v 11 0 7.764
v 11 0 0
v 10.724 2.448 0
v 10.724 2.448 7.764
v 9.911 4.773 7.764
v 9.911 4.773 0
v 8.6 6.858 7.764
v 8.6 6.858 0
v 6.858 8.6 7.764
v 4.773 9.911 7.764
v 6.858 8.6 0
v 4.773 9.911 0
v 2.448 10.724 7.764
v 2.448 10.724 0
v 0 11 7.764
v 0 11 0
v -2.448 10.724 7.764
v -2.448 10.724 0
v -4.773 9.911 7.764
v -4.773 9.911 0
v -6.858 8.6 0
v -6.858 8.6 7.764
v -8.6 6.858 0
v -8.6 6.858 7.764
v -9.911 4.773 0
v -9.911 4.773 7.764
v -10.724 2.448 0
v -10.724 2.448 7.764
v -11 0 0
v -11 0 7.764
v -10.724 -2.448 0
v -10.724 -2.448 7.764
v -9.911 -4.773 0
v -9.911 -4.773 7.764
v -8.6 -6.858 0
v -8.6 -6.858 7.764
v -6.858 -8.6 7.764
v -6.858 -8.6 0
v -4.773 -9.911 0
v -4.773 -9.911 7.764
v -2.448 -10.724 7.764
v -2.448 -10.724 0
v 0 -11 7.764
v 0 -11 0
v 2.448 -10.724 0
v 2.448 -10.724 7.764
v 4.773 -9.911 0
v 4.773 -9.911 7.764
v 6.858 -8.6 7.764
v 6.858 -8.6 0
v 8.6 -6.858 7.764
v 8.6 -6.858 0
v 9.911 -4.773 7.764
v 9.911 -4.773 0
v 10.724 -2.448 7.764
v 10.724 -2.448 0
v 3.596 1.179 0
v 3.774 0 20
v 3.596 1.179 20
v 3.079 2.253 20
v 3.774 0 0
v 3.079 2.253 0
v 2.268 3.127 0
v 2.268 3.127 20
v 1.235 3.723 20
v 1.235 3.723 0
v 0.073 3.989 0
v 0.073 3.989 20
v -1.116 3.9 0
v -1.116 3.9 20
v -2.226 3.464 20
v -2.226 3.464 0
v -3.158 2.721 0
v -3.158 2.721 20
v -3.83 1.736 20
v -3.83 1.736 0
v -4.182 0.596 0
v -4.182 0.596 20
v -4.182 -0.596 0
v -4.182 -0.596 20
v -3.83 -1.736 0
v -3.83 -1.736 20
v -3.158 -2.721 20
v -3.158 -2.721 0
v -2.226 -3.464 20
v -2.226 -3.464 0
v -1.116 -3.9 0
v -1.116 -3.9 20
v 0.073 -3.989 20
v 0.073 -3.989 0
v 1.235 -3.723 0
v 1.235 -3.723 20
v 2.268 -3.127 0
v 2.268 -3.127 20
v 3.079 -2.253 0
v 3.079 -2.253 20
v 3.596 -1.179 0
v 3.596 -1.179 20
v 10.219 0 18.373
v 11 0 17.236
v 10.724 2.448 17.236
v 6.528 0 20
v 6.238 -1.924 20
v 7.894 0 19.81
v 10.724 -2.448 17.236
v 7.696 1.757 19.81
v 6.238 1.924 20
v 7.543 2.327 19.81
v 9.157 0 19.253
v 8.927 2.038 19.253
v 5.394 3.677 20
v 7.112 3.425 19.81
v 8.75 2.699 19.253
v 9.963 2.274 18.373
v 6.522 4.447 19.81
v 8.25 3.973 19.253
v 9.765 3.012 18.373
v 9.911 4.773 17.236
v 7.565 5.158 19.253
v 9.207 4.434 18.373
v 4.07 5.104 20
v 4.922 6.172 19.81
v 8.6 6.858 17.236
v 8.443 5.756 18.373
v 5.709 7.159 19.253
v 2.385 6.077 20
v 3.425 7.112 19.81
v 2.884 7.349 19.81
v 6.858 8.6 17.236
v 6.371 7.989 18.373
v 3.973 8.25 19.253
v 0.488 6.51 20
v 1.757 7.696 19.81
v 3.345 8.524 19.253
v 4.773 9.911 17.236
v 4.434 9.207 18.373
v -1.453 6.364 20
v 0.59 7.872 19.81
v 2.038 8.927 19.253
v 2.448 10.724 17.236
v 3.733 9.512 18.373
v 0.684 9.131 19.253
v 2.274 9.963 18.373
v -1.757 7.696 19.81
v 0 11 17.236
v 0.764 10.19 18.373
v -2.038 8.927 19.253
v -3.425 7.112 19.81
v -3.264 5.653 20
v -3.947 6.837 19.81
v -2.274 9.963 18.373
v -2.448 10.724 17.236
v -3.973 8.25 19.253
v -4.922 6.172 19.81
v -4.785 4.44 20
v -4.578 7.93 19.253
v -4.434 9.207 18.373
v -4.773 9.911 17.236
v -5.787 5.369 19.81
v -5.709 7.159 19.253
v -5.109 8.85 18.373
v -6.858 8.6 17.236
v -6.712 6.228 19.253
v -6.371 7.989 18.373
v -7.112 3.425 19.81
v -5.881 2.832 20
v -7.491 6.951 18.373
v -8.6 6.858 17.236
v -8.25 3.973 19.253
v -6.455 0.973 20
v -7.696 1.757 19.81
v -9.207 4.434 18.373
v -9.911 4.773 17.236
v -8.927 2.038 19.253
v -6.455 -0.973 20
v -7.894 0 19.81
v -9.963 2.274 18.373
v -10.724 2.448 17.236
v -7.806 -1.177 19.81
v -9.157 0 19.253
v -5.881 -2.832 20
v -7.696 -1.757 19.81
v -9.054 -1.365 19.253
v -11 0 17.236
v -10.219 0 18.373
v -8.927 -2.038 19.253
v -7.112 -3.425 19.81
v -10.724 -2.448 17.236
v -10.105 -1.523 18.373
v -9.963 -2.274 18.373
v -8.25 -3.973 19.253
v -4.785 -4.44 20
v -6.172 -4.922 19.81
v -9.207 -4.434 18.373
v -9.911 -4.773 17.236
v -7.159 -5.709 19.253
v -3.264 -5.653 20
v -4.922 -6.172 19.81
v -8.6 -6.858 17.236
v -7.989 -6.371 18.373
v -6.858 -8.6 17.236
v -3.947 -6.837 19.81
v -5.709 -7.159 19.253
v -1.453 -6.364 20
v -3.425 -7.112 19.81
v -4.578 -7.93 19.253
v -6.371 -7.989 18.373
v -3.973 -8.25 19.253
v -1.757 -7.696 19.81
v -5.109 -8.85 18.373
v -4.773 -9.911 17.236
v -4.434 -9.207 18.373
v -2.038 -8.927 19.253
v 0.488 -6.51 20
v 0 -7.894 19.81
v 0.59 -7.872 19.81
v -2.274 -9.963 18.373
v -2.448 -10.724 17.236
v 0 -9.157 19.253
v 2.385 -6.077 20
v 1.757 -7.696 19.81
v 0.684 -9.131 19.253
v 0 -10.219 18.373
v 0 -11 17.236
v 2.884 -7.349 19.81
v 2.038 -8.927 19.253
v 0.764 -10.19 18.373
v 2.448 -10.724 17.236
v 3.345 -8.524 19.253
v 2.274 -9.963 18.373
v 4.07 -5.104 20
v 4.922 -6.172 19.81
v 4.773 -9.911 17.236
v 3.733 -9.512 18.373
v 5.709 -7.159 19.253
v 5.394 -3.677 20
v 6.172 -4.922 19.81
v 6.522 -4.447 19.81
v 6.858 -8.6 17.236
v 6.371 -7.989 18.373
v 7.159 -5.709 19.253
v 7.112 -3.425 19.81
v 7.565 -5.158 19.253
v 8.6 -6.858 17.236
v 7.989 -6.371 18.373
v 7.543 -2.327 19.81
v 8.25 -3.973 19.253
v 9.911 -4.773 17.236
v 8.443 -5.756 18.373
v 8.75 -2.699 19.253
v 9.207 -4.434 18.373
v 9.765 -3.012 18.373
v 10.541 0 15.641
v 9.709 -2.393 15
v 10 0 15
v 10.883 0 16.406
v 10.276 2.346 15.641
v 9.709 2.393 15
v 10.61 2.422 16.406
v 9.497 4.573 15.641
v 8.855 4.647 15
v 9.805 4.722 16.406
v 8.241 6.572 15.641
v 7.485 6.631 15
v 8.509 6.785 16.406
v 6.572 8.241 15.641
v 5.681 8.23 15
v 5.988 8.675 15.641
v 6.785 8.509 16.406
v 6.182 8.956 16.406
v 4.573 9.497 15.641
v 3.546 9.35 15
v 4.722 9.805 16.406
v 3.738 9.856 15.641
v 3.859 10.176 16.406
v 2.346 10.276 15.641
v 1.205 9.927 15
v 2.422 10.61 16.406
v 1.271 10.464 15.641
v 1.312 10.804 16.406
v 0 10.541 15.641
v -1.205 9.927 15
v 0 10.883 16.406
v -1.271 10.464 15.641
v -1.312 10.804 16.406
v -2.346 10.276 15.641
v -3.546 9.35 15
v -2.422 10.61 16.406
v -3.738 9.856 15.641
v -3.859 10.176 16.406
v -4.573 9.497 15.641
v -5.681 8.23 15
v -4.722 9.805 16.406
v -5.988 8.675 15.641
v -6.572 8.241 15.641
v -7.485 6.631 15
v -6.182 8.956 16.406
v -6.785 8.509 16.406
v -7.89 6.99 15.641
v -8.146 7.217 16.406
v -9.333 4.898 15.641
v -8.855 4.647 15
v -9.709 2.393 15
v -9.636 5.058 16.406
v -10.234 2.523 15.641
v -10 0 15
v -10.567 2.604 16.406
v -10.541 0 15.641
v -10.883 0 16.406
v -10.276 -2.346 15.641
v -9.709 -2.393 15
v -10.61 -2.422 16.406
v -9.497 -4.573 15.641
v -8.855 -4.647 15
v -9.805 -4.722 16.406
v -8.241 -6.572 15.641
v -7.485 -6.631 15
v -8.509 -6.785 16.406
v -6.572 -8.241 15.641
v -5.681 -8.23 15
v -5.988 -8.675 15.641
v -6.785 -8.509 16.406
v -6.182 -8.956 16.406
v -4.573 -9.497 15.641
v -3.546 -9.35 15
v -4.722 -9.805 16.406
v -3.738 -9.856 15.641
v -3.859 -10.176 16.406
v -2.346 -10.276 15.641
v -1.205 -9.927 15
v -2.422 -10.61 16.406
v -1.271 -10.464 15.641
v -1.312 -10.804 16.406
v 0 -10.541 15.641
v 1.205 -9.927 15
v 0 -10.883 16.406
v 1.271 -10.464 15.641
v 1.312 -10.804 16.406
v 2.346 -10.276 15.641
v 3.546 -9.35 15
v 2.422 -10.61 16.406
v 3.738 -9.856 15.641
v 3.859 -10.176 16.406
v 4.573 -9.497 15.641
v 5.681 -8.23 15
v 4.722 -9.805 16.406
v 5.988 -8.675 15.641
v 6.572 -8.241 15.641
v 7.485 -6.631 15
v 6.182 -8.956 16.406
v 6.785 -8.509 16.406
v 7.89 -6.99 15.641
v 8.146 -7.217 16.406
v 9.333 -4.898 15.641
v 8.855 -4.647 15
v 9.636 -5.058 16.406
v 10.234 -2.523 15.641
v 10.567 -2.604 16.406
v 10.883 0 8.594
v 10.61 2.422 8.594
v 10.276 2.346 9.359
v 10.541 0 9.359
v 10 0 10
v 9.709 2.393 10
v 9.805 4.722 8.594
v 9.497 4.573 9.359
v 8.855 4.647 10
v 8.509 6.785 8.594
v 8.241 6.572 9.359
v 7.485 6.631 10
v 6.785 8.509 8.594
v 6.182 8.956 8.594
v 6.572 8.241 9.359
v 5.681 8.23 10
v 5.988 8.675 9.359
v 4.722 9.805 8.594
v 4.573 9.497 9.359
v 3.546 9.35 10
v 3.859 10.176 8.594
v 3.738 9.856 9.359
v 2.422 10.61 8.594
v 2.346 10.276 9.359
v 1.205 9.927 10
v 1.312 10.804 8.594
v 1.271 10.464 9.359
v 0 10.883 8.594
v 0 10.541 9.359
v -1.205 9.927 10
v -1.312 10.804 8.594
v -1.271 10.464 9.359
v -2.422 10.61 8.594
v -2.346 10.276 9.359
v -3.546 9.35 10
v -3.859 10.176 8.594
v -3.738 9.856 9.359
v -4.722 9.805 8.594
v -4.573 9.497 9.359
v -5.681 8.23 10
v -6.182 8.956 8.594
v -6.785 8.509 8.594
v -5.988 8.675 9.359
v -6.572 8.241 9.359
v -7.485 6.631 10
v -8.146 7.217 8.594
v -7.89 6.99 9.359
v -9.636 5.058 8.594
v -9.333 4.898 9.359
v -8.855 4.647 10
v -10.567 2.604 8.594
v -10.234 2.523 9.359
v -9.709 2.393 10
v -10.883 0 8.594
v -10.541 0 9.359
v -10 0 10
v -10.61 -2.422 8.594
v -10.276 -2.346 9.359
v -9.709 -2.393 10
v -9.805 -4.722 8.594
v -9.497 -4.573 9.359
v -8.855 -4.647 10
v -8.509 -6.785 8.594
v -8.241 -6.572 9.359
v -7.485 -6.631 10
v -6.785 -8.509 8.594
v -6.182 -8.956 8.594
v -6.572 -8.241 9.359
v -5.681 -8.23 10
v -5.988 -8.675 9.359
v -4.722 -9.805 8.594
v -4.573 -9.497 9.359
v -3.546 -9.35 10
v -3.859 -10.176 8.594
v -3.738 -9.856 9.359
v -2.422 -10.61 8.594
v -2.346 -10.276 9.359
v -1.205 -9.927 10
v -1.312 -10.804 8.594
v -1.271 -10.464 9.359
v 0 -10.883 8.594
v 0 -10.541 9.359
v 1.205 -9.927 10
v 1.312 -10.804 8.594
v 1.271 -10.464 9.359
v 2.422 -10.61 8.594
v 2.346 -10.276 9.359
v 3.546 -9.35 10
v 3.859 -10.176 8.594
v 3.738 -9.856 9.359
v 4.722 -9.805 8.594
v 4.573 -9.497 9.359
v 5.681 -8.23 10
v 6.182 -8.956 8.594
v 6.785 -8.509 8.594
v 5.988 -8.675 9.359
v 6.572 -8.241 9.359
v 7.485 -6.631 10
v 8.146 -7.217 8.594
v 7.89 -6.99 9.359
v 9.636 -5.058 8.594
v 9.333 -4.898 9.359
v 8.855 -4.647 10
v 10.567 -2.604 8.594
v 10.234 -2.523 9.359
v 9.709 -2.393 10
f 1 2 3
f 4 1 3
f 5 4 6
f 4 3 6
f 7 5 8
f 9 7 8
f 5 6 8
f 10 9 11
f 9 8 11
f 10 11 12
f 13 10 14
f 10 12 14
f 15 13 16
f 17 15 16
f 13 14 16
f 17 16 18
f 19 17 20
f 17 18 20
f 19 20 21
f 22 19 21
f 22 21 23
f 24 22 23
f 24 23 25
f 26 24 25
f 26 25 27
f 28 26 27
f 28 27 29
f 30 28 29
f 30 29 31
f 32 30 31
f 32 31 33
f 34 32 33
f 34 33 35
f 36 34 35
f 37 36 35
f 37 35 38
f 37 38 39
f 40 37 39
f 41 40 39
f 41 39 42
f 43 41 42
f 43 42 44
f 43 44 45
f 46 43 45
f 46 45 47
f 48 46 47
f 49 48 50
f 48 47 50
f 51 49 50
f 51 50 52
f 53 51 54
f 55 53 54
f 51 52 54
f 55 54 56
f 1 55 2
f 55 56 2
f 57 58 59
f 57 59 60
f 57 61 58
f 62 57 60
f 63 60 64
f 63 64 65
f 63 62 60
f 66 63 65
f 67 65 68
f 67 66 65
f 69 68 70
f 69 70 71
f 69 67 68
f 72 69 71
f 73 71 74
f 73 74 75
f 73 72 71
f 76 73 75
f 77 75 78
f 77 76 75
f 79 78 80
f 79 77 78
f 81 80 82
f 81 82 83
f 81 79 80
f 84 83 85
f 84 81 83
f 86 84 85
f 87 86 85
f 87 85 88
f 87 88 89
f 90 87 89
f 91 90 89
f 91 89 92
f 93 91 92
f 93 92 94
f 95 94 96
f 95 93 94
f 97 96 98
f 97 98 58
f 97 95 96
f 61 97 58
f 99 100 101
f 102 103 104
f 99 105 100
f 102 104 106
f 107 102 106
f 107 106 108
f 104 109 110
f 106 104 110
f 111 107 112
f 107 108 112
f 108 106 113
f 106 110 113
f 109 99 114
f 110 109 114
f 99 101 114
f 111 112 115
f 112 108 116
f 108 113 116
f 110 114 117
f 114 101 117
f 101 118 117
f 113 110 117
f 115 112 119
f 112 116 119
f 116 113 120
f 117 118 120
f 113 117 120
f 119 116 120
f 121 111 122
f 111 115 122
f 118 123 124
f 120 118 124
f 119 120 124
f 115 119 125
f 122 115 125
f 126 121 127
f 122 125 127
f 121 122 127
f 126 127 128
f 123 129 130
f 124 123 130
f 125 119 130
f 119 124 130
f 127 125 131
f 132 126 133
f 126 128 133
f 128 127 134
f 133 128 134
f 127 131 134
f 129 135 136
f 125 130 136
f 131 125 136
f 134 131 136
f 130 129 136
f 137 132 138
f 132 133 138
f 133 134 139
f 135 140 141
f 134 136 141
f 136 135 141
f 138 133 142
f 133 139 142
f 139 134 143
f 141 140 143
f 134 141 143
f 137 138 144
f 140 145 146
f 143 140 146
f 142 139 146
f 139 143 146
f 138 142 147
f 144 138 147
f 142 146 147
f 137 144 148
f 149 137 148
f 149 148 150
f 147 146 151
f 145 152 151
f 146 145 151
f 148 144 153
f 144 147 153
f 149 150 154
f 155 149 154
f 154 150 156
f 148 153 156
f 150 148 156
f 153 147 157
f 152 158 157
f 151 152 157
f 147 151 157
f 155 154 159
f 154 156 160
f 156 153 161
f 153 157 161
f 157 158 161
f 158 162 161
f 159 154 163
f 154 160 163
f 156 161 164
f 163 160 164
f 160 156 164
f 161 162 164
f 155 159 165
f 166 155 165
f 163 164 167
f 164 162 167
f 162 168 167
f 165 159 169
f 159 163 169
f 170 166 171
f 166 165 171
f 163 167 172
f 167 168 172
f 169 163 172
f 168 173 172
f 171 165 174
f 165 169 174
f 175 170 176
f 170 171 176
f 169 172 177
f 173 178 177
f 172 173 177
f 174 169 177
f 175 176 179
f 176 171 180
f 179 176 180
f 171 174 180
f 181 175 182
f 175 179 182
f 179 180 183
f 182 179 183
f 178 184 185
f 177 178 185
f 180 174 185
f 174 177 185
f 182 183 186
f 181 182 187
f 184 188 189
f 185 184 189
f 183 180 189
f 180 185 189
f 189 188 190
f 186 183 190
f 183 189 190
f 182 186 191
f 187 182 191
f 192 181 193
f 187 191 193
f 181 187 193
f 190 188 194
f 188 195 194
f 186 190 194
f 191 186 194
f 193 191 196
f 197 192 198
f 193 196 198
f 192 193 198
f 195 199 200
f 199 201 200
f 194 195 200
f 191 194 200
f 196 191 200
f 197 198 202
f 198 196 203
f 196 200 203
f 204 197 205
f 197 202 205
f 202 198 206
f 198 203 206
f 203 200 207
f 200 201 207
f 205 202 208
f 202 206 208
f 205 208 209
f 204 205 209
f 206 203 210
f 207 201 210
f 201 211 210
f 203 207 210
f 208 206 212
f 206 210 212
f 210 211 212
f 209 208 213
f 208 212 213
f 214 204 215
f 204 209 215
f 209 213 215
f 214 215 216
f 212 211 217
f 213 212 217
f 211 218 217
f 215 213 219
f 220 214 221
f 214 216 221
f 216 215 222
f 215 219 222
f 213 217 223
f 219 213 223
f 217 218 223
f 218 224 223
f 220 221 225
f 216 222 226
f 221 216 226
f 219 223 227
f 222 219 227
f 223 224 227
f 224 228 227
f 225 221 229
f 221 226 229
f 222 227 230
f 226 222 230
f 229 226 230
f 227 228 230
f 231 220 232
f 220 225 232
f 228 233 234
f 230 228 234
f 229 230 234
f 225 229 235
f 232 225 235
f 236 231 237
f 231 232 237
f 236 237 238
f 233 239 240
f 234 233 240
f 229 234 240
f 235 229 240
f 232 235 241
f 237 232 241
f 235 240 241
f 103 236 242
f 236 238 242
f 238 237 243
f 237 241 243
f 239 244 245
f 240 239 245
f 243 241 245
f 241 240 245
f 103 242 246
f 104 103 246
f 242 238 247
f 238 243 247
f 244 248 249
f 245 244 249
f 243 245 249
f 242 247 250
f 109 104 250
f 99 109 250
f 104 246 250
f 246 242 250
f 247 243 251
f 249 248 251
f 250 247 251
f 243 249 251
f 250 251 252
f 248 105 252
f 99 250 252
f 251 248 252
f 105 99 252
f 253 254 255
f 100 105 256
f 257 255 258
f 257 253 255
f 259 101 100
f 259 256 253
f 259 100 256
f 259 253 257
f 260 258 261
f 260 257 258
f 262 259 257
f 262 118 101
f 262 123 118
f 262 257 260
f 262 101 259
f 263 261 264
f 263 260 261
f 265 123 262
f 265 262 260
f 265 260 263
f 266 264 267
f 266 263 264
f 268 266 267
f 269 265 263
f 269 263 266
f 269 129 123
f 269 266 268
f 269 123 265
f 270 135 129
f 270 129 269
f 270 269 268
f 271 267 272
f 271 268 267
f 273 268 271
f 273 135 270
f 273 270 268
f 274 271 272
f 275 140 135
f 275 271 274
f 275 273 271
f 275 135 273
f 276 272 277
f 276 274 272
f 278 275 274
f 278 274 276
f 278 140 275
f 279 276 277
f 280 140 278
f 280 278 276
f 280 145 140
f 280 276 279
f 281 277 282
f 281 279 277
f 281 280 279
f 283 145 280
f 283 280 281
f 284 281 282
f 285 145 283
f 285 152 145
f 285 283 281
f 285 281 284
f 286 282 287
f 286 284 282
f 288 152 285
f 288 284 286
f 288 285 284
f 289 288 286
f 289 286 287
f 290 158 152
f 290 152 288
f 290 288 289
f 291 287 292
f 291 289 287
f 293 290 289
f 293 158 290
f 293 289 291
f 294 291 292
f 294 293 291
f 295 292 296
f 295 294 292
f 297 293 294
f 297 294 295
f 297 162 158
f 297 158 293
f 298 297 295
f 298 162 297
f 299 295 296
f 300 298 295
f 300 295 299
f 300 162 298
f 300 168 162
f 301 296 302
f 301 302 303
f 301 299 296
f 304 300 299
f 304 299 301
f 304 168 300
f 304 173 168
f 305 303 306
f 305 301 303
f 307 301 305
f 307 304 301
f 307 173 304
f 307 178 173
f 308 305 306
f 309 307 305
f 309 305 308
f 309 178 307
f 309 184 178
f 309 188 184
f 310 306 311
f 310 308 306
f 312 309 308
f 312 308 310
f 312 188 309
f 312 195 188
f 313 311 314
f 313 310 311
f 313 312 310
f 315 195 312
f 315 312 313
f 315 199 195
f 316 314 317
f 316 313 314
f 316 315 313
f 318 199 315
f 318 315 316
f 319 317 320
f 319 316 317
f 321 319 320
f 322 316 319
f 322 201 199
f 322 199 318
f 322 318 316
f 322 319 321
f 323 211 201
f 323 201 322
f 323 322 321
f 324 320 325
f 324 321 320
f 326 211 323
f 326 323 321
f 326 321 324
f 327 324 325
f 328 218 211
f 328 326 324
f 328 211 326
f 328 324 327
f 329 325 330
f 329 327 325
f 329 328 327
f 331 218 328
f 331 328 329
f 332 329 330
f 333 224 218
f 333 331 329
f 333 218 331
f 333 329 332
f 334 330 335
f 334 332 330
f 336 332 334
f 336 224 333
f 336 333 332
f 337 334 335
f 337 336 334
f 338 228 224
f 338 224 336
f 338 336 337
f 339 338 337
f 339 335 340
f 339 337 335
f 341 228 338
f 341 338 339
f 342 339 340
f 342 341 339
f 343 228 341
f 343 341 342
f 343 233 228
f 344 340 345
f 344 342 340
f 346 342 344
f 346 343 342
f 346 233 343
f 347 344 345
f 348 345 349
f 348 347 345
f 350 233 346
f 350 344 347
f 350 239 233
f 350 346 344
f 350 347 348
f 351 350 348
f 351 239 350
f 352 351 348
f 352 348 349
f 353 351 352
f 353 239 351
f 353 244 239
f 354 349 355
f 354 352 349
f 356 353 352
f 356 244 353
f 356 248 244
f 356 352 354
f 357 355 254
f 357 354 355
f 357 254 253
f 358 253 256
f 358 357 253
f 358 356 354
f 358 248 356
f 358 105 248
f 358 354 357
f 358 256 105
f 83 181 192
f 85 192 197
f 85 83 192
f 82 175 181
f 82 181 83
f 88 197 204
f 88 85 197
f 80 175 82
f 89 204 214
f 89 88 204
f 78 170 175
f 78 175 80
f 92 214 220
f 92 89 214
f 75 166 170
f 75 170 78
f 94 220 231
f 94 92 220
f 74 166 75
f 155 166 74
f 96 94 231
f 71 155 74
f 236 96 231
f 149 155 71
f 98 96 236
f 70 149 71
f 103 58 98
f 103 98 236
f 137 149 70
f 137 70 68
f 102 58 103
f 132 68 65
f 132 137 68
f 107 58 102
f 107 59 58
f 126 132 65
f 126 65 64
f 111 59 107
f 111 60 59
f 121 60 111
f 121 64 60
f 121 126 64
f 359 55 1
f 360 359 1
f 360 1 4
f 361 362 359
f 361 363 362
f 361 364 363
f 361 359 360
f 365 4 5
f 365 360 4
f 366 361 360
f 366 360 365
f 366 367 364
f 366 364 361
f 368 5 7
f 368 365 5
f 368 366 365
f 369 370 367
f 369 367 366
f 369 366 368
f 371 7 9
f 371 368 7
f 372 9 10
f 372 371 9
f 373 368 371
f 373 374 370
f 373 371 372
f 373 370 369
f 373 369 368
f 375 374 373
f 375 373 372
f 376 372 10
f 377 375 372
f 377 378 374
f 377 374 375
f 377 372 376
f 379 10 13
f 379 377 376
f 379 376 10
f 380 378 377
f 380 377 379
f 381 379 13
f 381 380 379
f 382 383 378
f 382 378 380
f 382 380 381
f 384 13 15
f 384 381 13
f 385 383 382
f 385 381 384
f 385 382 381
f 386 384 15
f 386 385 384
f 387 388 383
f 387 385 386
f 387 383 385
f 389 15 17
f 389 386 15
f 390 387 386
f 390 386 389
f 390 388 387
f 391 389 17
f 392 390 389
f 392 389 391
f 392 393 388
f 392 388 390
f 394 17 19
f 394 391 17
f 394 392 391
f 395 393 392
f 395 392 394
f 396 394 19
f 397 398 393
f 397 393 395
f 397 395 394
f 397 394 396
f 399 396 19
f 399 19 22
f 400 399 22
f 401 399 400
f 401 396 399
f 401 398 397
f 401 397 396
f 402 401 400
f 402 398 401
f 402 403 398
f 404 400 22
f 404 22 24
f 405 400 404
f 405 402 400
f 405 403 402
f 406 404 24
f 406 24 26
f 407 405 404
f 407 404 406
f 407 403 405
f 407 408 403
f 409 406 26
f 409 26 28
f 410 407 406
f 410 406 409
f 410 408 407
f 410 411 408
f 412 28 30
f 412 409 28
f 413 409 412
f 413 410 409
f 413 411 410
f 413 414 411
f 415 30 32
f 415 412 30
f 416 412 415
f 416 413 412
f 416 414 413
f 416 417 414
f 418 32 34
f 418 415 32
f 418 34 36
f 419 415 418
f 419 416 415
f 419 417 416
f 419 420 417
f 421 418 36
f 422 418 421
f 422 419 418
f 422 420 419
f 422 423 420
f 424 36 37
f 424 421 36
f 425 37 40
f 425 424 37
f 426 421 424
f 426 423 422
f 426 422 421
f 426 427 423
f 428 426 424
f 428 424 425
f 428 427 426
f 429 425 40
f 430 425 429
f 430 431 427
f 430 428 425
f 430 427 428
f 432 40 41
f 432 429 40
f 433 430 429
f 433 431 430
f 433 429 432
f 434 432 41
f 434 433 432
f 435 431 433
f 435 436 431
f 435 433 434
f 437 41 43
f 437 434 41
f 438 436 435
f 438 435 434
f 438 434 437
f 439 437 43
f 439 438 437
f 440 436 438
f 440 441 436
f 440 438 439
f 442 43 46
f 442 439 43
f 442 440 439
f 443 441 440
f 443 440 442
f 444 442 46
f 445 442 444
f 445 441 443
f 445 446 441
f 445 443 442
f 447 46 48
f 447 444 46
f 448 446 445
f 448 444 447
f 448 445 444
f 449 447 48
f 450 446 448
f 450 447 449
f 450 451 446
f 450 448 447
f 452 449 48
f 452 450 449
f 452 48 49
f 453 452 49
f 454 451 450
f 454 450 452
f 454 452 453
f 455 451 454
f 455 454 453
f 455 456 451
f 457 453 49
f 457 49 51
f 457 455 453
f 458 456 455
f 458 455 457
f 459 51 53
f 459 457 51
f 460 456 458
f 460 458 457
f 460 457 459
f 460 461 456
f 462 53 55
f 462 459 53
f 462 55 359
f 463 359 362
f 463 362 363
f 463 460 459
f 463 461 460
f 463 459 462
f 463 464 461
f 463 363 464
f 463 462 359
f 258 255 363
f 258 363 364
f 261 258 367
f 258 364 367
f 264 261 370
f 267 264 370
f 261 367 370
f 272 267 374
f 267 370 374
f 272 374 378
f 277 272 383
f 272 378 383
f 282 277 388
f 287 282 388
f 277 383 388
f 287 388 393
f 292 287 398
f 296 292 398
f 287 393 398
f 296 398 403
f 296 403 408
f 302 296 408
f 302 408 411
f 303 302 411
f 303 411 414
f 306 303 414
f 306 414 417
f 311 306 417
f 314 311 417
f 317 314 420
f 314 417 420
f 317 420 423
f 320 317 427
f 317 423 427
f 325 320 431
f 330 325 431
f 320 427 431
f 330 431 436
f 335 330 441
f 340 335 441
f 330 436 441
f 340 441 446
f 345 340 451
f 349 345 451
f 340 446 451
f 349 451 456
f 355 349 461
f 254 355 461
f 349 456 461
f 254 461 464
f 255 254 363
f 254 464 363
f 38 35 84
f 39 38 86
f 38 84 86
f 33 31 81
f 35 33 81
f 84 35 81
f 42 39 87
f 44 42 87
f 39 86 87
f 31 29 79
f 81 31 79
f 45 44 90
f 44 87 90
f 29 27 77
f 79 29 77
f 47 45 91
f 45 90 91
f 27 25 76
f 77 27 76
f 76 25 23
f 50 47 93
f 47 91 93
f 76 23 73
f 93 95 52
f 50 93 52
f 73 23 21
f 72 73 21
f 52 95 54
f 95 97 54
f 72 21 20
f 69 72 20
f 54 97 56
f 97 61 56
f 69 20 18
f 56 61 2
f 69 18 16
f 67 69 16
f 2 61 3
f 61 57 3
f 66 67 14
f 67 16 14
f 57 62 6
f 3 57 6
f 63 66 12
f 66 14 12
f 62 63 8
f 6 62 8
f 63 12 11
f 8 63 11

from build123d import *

# Parameters (mm, degrees)
F0_R     = 11
F0_R_2   = 4
F1_DEPTH = 10
F2_R     = 10
F2_R_2   = 4
F3_DEPTH = 5
F4_R     = 11
F4_R_2   = 10
F4_R_3   = 4
F5_DEPTH = 5


# Not quite as in the source:
# - a fillet or chamfer that OpenCascade refuses, or shapes differently, is made with other operations: its cross-section is extruded or revolved along the edge and cut away or added


with BuildPart() as f1:
    # F0 (on Top) → F1 (new body)
    with BuildSketch(Plane.XY):
        Circle(F0_R)
        with Locations((-0.2262097114, 0)):
            Circle(F0_R_2, mode=Mode.SUBTRACT)
    extrude(amount=F1_DEPTH)

    # F2 (on face) → F3 (join)
    with BuildSketch(Plane.XY.offset(10)):
        Circle(F2_R)
        with Locations((-0.2262097114, 0)):
            Circle(F2_R_2, mode=Mode.SUBTRACT)
    extrude(amount=F3_DEPTH)

    # F4 (on face) → F5 (join)
    with BuildSketch(Plane.XY.offset(15)):
        Circle(F4_R)
        Circle(F4_R_2, mode=Mode.SUBTRACT)
        Circle(F4_R_2)
        with Locations((-0.2262097114, 0)):
            Circle(F4_R_3, mode=Mode.SUBTRACT)
    extrude(amount=F5_DEPTH)

    # F6: fillet of radius 3 on 2 edges, made by hand

    # F6_s1 → F6_t2 (revolve, cut)
    with BuildSketch(Plane.XZ):
        with BuildLine():
            ThreePointArc((10, 15), (10.7386127875, 16.0113231061), (11, 17.2360679775))
            Line((11, 17.2360679775), (11, 15))
            Line((11, 15), (10, 15))
        make_face()
    revolve(axis=Axis((0, 0, 15), (0, 0, 1)), mode=Mode.SUBTRACT)

    # F6_s3 → F6_t4 (revolve, cut)
    with BuildSketch(Plane.XZ):
        with BuildLine():
            ThreePointArc((11, 7.7639320225), (10.7386127875, 8.9886768939), (10, 10))
            Line((10, 10), (11, 10))
            Line((11, 10), (11, 7.7639320225))
        make_face()
    revolve(axis=Axis((0, 0, 10), (0, 0, 1)), mode=Mode.SUBTRACT)

    # F7: fillet of radius 5 on 1 edges, made by hand

    # F7_s1 → F7_t2 (revolve, cut)
    with BuildSketch(Plane.XZ):
        with BuildLine():
            ThreePointArc((6.527864045, 20), (9.1565196056, 19.2532540418), (11, 17.2360679775))
            Line((11, 17.2360679775), (11, 20))
            Line((11, 20), (6.527864045, 20))
        make_face()
    revolve(axis=Axis((0, 0, 20), (0, 0, 1)), mode=Mode.SUBTRACT)


solid = f1.part
